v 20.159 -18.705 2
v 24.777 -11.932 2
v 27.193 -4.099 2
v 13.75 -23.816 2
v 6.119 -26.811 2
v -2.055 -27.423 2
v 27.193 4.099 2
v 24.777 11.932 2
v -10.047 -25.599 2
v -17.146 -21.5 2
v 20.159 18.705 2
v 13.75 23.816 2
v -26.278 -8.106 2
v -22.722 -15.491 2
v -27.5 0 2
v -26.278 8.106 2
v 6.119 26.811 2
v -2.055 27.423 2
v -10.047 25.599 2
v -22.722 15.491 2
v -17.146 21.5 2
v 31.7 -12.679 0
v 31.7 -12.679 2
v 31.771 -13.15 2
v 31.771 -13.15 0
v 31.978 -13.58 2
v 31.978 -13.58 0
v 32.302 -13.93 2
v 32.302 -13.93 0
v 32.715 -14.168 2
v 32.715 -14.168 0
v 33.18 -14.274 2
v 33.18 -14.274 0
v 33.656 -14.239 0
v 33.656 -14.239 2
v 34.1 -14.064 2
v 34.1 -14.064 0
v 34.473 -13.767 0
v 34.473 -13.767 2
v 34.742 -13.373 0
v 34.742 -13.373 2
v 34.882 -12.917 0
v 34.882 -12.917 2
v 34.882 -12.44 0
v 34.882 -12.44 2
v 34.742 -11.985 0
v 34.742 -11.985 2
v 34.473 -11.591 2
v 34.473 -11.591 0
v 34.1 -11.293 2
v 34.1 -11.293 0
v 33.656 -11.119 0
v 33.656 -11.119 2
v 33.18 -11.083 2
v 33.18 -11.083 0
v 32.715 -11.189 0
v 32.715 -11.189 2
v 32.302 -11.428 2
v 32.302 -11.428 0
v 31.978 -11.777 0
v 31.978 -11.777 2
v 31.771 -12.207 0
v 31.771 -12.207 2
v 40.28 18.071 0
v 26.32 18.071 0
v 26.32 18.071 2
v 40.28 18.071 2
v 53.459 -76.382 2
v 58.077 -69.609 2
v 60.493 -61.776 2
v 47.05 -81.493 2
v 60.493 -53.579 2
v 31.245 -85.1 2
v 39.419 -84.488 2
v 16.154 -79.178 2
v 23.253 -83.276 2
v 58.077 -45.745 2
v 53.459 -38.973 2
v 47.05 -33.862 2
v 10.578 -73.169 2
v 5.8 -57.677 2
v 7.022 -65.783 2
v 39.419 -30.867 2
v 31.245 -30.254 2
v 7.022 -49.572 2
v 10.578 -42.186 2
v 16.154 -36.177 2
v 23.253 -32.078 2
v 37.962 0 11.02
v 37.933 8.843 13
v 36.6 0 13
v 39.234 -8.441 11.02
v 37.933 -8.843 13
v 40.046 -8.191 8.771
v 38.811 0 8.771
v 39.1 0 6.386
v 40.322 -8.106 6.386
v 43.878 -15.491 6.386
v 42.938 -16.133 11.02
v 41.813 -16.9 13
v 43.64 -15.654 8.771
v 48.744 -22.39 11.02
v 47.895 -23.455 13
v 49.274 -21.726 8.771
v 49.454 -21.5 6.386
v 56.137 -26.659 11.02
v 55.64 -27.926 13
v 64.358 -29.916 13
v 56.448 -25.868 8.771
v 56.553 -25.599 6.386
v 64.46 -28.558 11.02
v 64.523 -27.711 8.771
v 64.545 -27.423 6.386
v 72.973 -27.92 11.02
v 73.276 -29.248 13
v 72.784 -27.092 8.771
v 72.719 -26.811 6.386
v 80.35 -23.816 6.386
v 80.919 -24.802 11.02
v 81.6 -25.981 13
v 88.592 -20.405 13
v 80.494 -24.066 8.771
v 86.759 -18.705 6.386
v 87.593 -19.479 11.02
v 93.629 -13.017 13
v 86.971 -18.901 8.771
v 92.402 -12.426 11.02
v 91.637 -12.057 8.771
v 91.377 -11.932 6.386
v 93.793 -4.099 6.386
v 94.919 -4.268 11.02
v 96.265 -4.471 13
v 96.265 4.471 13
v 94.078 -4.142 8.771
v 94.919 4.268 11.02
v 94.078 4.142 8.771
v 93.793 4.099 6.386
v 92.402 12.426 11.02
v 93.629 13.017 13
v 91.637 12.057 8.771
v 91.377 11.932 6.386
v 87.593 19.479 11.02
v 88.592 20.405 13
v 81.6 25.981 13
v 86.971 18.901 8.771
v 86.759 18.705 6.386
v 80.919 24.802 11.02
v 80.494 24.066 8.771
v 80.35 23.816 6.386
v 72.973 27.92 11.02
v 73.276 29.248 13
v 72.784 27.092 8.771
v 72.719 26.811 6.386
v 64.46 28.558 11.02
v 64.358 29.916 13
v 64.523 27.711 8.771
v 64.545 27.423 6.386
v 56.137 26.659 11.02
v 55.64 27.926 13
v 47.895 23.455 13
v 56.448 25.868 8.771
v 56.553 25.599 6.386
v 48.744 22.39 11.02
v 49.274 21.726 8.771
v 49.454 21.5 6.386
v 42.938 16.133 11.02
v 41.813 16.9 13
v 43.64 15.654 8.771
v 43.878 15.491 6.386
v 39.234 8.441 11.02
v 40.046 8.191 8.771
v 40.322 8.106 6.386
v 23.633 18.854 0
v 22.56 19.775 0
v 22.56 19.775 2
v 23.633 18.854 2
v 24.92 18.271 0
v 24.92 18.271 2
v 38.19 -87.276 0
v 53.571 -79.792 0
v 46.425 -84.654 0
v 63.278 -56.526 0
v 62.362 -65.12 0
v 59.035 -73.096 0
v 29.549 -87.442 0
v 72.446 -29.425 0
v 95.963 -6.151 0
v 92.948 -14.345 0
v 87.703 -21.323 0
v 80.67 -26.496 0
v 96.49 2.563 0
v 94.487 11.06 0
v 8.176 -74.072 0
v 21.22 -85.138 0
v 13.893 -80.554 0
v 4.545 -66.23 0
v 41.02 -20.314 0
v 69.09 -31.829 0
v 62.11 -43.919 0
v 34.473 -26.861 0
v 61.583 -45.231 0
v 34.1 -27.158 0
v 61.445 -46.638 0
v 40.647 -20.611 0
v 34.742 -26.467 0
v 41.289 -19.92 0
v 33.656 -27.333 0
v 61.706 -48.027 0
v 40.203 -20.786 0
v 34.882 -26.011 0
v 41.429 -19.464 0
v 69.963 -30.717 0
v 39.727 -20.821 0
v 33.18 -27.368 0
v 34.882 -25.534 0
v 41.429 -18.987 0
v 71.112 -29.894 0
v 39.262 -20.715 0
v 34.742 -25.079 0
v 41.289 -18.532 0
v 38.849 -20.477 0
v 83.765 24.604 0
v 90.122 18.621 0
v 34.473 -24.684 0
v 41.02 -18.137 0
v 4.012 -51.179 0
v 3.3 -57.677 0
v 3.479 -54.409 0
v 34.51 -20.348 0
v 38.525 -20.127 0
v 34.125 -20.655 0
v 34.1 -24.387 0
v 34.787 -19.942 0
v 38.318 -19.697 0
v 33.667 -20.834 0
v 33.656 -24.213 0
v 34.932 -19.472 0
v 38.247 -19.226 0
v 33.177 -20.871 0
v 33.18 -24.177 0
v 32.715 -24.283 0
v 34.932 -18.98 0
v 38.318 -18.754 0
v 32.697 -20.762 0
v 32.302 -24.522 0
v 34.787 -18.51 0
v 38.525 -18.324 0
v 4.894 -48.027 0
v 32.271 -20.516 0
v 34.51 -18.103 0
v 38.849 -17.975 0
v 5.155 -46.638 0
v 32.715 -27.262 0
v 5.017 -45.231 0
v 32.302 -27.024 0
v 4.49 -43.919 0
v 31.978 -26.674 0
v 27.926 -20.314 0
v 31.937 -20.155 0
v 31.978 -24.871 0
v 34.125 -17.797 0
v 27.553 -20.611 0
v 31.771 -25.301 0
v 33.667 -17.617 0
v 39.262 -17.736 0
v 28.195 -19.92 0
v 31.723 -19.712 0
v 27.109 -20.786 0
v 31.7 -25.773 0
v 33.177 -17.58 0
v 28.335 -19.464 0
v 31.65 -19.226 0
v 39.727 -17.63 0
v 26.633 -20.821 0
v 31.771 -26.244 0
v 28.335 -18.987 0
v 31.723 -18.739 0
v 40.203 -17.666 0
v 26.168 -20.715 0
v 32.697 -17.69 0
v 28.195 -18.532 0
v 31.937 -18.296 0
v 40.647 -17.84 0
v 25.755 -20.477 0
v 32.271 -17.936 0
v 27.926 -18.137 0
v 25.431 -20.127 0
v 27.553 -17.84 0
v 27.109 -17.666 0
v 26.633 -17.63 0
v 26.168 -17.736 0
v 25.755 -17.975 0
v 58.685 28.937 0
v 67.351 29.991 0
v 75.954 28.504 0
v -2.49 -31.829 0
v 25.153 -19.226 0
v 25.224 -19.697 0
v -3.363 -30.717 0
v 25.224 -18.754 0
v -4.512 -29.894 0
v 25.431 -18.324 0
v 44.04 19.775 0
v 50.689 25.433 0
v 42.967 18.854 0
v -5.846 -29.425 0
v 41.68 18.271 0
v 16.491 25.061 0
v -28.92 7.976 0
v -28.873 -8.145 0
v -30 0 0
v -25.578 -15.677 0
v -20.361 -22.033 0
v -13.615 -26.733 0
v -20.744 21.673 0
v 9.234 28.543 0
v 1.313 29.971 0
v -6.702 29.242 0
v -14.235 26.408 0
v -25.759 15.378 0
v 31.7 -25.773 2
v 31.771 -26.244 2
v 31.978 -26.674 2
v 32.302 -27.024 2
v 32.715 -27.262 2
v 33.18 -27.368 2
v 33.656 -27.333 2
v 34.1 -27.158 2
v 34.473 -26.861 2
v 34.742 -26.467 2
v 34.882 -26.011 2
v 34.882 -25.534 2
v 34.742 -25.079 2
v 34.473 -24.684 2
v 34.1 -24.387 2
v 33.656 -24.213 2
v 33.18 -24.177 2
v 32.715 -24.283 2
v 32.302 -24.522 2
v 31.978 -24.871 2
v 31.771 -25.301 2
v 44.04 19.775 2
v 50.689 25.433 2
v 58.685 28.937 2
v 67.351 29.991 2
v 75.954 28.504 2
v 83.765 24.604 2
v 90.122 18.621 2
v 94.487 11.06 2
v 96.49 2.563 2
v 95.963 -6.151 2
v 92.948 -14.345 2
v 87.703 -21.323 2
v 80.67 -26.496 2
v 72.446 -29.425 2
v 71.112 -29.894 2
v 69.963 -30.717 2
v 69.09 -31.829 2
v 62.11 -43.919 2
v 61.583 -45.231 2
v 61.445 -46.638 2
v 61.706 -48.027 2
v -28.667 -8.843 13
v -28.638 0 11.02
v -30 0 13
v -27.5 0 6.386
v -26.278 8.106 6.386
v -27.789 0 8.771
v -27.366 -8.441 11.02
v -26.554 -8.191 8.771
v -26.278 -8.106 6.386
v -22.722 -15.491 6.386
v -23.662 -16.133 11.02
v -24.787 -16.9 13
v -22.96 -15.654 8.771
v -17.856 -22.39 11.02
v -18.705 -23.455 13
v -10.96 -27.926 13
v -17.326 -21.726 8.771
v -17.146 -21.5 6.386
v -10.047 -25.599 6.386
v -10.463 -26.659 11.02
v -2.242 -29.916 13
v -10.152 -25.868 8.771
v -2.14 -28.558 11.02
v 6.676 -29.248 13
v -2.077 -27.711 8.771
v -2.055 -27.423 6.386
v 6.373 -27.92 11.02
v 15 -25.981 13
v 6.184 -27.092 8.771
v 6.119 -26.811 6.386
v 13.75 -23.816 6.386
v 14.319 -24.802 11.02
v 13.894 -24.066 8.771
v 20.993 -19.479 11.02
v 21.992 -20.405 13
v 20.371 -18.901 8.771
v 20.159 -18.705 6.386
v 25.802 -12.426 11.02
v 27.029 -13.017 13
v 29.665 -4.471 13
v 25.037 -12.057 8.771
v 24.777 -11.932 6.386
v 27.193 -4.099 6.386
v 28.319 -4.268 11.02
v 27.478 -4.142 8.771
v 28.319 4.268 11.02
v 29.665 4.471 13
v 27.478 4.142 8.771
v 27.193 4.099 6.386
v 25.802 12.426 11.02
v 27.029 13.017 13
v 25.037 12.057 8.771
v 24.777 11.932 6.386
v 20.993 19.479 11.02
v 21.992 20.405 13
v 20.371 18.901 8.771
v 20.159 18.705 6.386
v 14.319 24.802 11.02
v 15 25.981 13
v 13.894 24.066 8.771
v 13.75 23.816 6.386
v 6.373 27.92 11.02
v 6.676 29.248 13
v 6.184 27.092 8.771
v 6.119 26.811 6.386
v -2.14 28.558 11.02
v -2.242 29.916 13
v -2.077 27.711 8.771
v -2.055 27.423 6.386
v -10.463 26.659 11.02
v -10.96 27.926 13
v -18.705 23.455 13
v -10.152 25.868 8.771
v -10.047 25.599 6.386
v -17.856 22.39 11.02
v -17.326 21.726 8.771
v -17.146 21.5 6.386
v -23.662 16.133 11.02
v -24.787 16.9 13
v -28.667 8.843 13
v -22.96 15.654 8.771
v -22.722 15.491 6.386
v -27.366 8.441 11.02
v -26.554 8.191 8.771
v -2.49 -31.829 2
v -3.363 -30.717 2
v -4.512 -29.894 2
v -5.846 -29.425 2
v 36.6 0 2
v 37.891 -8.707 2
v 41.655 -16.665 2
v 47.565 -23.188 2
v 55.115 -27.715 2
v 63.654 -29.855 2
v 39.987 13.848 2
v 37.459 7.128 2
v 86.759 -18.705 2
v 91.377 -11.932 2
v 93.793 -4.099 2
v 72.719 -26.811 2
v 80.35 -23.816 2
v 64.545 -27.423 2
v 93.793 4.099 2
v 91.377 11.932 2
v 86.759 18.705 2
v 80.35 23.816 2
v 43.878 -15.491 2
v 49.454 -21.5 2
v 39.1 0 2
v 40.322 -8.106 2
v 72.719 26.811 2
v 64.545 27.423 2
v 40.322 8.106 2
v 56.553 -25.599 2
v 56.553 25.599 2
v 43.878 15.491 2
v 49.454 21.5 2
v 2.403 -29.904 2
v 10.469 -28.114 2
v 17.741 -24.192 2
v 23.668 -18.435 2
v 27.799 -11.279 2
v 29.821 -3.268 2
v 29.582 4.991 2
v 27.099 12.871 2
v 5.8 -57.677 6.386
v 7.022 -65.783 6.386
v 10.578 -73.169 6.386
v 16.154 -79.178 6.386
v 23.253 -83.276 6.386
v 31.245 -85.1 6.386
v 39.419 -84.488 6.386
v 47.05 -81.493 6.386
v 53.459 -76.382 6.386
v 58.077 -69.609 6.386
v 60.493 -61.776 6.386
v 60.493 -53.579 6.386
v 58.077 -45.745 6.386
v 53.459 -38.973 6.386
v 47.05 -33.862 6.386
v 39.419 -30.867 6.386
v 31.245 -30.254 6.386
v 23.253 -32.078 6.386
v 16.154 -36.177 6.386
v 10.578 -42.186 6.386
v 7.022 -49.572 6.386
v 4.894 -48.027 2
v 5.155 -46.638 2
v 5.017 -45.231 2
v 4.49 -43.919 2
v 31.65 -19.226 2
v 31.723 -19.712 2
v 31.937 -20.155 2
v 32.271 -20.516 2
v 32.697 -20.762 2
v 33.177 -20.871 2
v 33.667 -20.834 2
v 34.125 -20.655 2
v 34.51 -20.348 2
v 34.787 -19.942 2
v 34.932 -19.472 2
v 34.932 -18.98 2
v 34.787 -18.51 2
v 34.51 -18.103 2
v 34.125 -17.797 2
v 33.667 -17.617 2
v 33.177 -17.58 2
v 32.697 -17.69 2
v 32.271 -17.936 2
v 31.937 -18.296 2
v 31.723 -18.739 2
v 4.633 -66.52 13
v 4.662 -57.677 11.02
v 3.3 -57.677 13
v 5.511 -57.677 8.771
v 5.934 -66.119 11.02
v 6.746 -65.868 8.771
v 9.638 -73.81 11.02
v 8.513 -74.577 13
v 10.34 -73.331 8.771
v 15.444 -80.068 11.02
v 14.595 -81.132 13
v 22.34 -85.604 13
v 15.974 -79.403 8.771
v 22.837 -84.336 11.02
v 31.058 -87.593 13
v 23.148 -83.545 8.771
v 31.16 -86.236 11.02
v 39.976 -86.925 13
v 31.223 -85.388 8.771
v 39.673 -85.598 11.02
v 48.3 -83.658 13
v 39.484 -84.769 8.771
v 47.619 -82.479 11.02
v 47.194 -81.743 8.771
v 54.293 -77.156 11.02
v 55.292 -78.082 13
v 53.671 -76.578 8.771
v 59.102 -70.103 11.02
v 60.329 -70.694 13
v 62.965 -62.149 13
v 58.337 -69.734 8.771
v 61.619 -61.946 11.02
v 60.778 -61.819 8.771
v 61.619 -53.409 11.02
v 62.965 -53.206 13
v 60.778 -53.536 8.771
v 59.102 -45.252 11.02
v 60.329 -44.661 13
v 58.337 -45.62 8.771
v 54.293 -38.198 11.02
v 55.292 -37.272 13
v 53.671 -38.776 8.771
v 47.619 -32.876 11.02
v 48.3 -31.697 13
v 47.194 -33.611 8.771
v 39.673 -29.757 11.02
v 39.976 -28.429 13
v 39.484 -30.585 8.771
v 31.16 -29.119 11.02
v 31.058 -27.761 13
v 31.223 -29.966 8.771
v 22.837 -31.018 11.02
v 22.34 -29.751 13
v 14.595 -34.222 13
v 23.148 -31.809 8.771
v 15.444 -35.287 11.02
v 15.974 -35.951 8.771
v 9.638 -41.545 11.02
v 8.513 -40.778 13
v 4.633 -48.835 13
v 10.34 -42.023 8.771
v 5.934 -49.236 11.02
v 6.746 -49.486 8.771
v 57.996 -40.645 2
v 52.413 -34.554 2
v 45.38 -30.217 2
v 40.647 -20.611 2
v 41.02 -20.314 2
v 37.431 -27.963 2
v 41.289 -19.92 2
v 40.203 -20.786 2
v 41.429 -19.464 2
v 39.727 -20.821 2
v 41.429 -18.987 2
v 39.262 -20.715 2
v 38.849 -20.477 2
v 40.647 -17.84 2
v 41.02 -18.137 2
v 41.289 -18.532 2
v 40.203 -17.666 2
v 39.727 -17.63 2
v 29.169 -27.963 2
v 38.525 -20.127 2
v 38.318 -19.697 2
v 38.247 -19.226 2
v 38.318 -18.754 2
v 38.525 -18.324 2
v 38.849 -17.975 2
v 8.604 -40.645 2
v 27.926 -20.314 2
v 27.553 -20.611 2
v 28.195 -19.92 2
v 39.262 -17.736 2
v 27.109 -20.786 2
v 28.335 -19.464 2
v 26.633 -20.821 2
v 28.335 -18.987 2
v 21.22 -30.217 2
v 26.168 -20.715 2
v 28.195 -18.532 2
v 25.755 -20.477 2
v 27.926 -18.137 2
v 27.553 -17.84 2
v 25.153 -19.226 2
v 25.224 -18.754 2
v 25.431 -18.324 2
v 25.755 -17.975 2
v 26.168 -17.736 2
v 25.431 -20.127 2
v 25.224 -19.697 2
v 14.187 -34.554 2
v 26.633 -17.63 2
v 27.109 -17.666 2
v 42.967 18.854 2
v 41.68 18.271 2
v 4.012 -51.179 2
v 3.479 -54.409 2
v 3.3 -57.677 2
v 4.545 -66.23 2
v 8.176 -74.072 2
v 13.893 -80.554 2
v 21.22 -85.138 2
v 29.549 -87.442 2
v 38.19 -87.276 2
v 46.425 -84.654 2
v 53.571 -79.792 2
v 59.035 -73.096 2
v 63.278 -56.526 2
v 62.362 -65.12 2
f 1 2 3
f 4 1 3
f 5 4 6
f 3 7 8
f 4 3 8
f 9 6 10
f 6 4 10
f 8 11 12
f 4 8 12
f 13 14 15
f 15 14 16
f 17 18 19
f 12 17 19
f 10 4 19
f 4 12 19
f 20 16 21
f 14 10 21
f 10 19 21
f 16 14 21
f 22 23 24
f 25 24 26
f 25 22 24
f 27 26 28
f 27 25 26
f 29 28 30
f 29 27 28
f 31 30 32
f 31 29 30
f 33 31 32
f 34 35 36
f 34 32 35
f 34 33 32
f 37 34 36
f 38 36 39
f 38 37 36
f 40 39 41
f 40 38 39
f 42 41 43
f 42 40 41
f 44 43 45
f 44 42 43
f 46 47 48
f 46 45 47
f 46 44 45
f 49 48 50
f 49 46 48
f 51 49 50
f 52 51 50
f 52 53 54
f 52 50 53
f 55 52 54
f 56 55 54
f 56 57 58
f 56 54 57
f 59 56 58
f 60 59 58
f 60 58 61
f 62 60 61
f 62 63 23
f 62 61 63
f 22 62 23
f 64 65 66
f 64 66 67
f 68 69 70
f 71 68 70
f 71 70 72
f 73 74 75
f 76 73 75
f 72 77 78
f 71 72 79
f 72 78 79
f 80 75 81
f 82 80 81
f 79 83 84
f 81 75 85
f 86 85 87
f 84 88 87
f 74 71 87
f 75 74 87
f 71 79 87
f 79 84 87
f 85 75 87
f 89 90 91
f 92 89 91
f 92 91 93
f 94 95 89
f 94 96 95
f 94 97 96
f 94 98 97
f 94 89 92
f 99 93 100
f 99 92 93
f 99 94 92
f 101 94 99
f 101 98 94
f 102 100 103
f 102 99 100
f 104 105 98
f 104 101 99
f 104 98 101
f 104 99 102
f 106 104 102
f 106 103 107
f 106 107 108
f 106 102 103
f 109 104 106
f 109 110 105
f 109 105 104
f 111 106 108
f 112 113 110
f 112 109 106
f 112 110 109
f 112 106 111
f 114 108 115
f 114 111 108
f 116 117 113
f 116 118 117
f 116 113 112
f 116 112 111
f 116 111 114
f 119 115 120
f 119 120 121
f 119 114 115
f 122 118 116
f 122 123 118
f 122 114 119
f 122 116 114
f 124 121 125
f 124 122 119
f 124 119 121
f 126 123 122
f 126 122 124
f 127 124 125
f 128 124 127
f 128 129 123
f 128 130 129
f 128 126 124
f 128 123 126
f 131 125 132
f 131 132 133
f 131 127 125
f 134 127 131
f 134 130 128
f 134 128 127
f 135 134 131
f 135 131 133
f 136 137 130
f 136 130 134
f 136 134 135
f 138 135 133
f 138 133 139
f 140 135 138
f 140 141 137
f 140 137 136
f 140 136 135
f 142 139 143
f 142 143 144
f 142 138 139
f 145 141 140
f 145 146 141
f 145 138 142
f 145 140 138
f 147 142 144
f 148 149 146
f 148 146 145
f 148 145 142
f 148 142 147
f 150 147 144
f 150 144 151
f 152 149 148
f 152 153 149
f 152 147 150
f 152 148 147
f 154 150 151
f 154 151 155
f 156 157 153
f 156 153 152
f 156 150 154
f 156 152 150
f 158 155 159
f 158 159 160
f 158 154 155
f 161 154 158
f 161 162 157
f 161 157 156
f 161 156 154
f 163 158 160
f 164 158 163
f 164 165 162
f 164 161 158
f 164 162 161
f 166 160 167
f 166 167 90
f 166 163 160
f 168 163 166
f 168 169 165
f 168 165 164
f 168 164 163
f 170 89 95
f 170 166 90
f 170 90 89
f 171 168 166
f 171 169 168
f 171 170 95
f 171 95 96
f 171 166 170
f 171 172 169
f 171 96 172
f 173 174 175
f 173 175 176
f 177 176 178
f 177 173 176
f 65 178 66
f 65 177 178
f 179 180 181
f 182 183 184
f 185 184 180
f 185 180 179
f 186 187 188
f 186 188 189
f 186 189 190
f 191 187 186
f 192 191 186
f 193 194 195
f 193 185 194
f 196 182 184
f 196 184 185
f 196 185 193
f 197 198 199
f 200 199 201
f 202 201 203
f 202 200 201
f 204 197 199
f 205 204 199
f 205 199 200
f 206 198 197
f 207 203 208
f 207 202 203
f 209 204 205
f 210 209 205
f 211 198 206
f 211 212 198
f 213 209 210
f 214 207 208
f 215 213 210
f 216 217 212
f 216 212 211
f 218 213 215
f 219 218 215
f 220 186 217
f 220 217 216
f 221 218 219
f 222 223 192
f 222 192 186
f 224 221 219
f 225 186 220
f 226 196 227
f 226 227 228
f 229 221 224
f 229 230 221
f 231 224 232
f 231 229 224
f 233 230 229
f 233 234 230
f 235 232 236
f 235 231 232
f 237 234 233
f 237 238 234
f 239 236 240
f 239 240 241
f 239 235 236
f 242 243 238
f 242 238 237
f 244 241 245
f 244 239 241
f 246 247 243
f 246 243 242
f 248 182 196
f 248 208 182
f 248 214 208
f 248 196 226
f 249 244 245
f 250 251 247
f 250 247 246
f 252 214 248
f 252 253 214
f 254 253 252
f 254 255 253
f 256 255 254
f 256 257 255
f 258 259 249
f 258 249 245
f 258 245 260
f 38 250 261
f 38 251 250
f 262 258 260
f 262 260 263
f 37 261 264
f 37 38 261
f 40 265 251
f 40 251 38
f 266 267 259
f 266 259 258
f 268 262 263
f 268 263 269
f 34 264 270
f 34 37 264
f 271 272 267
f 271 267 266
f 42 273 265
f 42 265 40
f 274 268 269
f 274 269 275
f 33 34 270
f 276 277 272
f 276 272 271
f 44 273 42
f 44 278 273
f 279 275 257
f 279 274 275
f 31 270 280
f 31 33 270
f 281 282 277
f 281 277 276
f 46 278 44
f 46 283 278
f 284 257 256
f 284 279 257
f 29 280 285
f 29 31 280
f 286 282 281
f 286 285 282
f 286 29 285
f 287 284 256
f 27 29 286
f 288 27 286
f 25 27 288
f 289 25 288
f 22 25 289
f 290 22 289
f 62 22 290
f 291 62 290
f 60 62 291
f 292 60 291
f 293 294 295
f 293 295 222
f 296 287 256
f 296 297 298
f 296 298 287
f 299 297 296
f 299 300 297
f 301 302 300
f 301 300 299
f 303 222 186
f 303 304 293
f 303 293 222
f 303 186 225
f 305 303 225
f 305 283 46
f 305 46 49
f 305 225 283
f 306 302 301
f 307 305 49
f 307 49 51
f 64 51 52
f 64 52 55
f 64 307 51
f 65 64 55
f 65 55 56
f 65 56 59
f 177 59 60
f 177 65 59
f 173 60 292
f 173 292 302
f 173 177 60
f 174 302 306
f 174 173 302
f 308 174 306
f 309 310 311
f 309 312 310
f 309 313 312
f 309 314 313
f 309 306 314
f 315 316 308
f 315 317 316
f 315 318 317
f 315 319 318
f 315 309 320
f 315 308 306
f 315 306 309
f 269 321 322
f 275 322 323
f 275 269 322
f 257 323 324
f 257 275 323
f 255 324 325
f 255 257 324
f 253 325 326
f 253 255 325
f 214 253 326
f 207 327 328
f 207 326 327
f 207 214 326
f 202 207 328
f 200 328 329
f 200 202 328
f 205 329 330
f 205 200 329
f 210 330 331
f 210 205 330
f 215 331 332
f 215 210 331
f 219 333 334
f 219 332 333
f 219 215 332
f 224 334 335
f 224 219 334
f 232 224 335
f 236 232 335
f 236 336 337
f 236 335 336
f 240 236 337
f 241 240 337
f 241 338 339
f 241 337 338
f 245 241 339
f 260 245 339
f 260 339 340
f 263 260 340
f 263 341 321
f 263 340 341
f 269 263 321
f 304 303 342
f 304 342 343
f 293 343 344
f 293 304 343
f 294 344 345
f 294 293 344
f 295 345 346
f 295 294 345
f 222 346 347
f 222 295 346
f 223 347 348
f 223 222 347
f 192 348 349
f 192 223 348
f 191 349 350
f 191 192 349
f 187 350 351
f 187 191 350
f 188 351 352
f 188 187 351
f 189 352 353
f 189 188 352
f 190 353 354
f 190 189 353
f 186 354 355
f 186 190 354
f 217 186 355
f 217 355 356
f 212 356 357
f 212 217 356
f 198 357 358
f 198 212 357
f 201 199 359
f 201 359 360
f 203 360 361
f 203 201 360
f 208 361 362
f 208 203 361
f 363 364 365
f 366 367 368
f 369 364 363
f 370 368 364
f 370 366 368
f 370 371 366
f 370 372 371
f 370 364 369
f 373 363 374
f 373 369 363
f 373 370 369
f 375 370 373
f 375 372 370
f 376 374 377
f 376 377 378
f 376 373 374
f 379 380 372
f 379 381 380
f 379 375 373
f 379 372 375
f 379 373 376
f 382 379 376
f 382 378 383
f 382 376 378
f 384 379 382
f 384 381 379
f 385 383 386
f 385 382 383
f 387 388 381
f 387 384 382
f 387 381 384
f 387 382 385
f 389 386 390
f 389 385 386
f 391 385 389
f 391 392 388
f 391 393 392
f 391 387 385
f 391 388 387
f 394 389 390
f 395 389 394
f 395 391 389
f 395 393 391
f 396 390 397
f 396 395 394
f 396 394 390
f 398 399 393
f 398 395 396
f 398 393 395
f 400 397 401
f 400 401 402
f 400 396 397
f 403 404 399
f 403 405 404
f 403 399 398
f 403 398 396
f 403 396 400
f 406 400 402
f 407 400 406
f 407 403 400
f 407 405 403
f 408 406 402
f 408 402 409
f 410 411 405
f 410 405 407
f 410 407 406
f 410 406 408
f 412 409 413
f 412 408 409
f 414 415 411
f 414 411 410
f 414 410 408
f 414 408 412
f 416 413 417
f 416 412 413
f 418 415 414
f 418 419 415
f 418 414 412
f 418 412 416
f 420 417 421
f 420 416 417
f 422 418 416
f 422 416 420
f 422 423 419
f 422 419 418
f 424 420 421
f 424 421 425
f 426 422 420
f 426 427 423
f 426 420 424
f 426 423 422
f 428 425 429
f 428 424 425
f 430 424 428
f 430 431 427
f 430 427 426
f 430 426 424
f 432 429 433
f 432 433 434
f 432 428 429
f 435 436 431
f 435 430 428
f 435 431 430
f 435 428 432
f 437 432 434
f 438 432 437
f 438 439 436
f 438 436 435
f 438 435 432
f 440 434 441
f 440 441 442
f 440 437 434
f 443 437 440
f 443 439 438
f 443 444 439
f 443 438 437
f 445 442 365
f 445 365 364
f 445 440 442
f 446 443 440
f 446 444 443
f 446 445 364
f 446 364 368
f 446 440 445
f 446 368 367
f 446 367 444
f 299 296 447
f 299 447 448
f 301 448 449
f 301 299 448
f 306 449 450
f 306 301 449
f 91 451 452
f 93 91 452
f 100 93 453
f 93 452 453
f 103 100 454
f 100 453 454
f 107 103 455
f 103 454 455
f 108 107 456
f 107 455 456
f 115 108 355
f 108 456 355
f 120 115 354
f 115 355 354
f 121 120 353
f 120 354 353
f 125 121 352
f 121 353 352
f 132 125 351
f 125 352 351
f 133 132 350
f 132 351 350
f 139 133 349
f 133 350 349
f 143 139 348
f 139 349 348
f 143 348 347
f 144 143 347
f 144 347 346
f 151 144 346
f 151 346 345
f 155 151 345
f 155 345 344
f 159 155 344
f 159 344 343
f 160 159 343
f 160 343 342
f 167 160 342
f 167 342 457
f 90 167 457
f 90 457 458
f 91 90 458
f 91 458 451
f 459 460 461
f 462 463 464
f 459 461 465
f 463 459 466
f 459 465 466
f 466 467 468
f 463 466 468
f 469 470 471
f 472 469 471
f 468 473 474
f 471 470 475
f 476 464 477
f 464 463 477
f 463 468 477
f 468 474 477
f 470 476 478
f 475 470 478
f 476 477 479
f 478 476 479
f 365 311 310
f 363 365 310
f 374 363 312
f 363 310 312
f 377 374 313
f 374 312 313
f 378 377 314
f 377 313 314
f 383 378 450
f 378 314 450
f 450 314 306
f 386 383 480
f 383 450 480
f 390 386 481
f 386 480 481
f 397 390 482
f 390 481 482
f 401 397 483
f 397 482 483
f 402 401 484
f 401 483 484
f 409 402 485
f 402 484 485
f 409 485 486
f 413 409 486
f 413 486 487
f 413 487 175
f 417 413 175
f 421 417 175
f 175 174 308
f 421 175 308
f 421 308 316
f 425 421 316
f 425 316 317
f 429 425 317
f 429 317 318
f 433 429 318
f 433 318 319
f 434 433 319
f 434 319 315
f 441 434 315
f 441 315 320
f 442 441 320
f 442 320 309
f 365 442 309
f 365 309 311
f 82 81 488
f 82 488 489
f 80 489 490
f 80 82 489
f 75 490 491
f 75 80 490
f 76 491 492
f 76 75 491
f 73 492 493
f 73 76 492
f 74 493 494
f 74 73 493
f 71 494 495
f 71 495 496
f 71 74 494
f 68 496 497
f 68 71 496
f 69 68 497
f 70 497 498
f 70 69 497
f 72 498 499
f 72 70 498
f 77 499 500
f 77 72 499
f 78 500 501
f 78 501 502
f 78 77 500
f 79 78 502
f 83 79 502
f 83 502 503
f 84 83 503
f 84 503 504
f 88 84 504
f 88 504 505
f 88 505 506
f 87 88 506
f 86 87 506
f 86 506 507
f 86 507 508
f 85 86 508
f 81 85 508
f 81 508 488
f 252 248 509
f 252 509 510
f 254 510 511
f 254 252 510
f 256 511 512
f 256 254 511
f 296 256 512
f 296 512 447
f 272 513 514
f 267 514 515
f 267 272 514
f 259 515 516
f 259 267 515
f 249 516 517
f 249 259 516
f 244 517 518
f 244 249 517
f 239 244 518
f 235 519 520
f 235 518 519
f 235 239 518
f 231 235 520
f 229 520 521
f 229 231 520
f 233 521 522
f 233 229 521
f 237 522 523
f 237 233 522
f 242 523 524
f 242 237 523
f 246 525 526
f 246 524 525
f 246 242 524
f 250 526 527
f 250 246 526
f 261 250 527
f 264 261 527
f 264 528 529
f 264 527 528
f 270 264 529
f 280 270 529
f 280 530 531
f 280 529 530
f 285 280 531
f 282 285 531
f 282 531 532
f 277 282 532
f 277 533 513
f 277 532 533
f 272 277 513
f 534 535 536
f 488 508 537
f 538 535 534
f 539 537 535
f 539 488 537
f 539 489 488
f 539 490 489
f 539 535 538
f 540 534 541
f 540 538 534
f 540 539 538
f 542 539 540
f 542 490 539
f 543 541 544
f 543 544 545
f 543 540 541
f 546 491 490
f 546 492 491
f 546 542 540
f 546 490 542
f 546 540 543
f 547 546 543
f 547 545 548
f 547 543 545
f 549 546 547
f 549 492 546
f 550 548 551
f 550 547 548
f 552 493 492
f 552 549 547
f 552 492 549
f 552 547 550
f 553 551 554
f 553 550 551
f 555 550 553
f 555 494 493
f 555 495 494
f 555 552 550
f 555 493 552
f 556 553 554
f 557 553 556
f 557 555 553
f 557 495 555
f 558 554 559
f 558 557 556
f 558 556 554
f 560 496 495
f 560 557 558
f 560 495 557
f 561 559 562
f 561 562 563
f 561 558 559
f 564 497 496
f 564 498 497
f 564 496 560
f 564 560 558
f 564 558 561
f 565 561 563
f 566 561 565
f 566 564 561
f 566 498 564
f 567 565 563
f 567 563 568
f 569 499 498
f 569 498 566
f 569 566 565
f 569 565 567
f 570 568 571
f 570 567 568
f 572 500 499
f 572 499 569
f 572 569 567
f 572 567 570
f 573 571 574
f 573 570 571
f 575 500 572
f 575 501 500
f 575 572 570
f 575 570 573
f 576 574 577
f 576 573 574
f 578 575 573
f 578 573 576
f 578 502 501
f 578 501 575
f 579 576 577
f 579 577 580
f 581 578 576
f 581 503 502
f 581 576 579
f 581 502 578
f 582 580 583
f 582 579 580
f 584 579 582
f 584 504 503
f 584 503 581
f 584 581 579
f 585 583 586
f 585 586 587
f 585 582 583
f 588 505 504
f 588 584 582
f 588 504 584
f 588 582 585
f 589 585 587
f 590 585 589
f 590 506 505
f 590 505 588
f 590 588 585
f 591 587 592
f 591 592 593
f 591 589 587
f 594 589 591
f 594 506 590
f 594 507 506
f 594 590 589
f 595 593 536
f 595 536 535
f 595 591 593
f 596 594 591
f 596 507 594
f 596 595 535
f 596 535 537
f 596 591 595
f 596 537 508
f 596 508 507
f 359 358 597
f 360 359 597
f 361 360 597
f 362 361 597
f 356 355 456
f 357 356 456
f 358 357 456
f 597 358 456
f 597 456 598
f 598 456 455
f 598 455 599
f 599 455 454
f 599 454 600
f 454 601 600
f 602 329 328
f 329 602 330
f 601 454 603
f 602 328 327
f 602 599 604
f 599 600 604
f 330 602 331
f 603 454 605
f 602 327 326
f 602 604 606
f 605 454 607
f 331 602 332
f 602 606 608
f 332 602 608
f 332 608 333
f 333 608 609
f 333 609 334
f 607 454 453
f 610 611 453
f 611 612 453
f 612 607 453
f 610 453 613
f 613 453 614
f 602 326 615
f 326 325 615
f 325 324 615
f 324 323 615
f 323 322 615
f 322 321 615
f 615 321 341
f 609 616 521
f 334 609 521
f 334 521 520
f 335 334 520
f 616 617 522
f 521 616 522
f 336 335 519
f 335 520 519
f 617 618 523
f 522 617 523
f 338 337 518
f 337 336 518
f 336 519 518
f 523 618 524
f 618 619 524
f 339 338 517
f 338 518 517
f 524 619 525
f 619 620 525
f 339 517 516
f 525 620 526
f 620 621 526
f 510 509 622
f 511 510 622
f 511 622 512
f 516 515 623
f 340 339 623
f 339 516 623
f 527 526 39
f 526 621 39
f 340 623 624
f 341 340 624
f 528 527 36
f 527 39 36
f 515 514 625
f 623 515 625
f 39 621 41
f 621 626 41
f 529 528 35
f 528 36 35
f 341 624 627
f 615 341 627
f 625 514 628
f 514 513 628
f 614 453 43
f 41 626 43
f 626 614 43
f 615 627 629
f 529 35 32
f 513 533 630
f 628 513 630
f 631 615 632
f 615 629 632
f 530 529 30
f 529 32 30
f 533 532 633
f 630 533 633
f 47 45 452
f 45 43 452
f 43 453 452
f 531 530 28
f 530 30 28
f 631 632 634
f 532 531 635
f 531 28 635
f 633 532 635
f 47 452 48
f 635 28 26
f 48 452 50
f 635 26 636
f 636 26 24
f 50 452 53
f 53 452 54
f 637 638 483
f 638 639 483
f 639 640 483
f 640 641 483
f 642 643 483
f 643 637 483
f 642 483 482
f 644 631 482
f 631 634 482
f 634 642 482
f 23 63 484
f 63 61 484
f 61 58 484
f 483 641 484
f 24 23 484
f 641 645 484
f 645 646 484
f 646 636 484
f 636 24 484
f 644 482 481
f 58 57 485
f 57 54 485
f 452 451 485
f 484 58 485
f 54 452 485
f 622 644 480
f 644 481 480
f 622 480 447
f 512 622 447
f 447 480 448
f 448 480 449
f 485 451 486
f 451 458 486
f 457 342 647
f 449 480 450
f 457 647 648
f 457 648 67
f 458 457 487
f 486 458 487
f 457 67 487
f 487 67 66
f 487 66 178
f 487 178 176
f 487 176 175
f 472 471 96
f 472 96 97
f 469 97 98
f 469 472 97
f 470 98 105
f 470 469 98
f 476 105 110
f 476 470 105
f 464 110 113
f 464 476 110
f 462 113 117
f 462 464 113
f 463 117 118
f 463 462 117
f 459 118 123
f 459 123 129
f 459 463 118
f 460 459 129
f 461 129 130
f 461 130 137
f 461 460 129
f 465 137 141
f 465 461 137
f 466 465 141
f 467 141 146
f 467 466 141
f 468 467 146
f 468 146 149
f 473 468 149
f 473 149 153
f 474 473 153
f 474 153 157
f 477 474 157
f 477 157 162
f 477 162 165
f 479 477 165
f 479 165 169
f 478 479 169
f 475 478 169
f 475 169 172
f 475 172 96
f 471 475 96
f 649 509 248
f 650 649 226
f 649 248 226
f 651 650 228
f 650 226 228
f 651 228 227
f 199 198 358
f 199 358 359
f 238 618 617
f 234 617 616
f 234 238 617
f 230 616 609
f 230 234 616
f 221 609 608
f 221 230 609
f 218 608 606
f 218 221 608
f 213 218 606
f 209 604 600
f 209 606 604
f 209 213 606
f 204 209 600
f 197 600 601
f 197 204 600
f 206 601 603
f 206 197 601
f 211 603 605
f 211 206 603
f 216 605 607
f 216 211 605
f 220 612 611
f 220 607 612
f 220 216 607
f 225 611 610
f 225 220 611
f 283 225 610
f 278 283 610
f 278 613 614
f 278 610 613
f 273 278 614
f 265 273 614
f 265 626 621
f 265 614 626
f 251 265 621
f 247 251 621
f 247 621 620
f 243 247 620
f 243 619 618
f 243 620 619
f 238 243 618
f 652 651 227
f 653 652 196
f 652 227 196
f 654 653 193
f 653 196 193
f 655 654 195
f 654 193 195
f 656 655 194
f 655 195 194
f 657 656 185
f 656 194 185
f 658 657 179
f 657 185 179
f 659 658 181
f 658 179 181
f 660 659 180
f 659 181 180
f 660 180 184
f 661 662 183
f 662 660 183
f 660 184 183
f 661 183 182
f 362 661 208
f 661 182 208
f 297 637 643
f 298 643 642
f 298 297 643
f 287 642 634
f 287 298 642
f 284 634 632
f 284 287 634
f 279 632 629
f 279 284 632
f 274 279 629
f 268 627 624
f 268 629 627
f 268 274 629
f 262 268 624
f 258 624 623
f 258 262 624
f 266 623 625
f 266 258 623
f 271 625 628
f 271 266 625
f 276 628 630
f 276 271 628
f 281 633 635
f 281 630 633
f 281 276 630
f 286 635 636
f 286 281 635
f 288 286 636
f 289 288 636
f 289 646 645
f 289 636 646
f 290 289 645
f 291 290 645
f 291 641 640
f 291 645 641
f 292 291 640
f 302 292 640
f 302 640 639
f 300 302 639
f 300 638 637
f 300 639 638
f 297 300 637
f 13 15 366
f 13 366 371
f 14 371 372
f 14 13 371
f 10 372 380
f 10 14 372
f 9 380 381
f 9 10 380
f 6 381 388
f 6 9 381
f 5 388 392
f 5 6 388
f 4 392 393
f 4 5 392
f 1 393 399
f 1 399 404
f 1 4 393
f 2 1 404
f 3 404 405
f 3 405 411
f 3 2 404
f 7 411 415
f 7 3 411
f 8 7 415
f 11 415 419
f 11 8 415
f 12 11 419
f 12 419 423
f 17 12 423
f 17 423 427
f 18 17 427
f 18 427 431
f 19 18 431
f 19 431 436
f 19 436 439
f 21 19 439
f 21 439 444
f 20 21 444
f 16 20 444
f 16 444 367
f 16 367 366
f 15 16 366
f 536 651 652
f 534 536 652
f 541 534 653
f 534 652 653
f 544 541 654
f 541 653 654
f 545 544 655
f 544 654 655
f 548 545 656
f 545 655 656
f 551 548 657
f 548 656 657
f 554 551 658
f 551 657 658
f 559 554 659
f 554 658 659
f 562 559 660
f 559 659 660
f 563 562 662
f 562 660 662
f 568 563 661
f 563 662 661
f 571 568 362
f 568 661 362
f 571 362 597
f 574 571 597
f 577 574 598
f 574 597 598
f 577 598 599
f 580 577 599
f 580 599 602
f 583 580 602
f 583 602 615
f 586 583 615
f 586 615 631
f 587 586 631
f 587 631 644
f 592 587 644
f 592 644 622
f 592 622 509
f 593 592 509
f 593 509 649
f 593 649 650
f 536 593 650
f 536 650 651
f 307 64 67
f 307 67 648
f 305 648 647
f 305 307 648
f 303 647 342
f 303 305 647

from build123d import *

# Parameters (mm, degrees)
SKETCH_1_R          = 30
SKETCH_1_R_2        = 27.5
EXTRUDE_1_DEPTH     = 13
SKETCH_1_R_3        = 29.999999999999996
EXTRUDE_1_2_DEPTH   = 13
EXTRUDE_1_3_DEPTH   = 13
EXTRUDE_2_DEPTH     = 2
SKETCH_3_R          = 1.6500000000000017
SKETCH_3_R_2        = 1.5999999999999979
SKETCH_3_R_3        = 1.5999999999999985
SKETCH_3_R_4        = 1.6000000000000019
CUT_EXTRUDE_5_DEPTH = 132.10250765535577
FILLET_1_R          = 10


with BuildPart() as part:
    # 草图1 → 凸台-拉伸1 (new body)
    with BuildSketch(Plane.XY):
        with Locations(Location((0, 0, 0), (0, 0, 180))):
            Circle(SKETCH_1_R)
        with Locations(Location((0, 0, 0), (0, 0, 180))):
            Circle(SKETCH_1_R_2, mode=Mode.SUBTRACT)
    extrude(amount=EXTRUDE_1_DEPTH)



with BuildPart() as body_2:
    # 草图1 → Extrude 1 2 (new body)
    with BuildSketch(Plane.XY):
        with Locations(Location((66.6, 0, 0), (0, 0, 180))):
            Circle(SKETCH_1_R_3)
        with Locations(Location((66.6, 0, 0), (0, 0, 180))):
            Circle(SKETCH_1_R_2, mode=Mode.SUBTRACT)
    extrude(amount=EXTRUDE_1_2_DEPTH)


with BuildPart() as body_3:
    # 草图1 → Extrude 1 3 (new body)
    with BuildSketch(Plane.XY):
        with Locations(Location((33.30000000000001, -57.6772918920436, 0), (0, 0, 180))):
            Circle(SKETCH_1_R_3)
        with Locations(Location((33.30000000000001, -57.6772918920436, 0), (0, 0, 180))):
            Circle(SKETCH_1_R_2, mode=Mode.SUBTRACT)
    extrude(amount=EXTRUDE_1_3_DEPTH)


with BuildPart() as part_1:
    add(part.part)

    add(body_2.part)  # 凸台-拉伸2 merges body 2

    add(body_3.part)  # 凸台-拉伸2 merges body 3
    # 草图2 → 凸台-拉伸2 (add)
    with BuildSketch(Plane.XY):
        with BuildLine():
            Line((26.3198925252566, 18.070831312697457), (40.280107474743396, 18.070831312697457))
            ThreePointArc((40.280107474743396, 18.070831312697457), (42.3441853289733, 18.516758123597654), (44.04009212120862, 19.77499826802639))
            ThreePointArc((44.04009212120862, 19.77499826802639), (92.58076211353317, 15), (72.44569692050842, -29.424952464083248))
            ThreePointArc((72.44569692050842, -29.424952464083248), (70.50807559525407, -30.264530756395246), (69.08985272167097, -31.829111208097117))
            Line((69.08985272167097, -31.829111208097117), (62.10974524692759, -43.91901199664395))
            ThreePointArc((62.10974524692759, -43.91901199664395), (61.46389026628078, -45.92951925924603), (61.70560479929982, -48.027337695986766))
            ThreePointArc((61.70560479929982, -48.027337695986766), (33.300000000000004, -87.6772918920436), (4.894395200700185, -48.02733769598677))
            ThreePointArc((4.894395200700185, -48.02733769598677), (5.13610973371921, -45.92951925924604), (4.4902547530724135, -43.91901199664397))
            Line((4.4902547530724135, -43.91901199664397), (-2.489852721670984, -31.829111208097103))
            ThreePointArc((-2.489852721670984, -31.829111208097103), (-3.9080755952540875, -30.264530756395228), (-5.845696920508439, -29.42495246408323))
            ThreePointArc((-5.845696920508439, -29.42495246408323), (-25.980762113533153, 15.000000000000009), (22.55990787879137, 19.77499826802639))
            ThreePointArc((22.55990787879137, 19.77499826802639), (24.25581467102669, 18.516758123597654), (26.3198925252566, 18.070831312697457))
        make_face()
    extrude(amount=EXTRUDE_2_DEPTH)

    # 草图3 → 切除-拉伸5 (cut, through all)
    with BuildSketch(Plane.XY):
        with Locations(Location((33.3, -19.225763964014533, 0), (0, 0, 180))):
            Circle(SKETCH_3_R)
        with Locations(Location((33.3, -12.678793774014526, 0), (0, 0, 180))):
            Circle(SKETCH_3_R_2)
        with Locations(Location((39.84697019, -19.225763964014533, 0), (0, 0, 180))):
            Circle(SKETCH_3_R_3)
        with Locations(Location((33.3, -25.772734154014536, 0), (0, 0, 180))):
            Circle(SKETCH_3_R_3)
        with Locations(Location((26.75302980999999, -19.225763964014533, 0), (0, 0, 180))):
            Circle(SKETCH_3_R_4)
    extrude(amount=CUT_EXTRUDE_5_DEPTH, mode=Mode.SUBTRACT)

    # 圆角1
    # the kernel refuses this fillet: 10 mm, written as the material it takes off along each edge
    with BuildSketch(Plane(origin=(0, 0, 13), x_dir=(-1, 1.2e-16, 0), z_dir=(1.2e-16, 1, 0))) as fillet_1_piece_1:
        with BuildLine():
            CenterArc((37.5, -6.614378277661482), FILLET_1_R, 138.59037789072914, 41.409622109270856)
            Line((27.5, -6.614378277661482), (27.3, -6.614378277661482))
            Line((27.3, -6.614378277661482), (27.3, 0))
            Line((27.3, 0), (27.5, 0.1999999999999993))
            ThreePointArc((27.5, 0.1999999999999993), (28.75, 0.1999999999999993), (29.85, 0.1322875655532254))
            Line((29.85, 0.1322875655532254), (30, -3.55e-15))
        make_face()
    revolve(axis=Axis((0, 0, 13), (0, 0, 1)), mode=Mode.SUBTRACT)
    with BuildSketch(Plane(origin=(66.6, 0, 13), x_dir=(-1, 1.2e-16, 0), z_dir=(1.2e-16, 1, 0))) as fillet_1_piece_2:
        with BuildLine():
            CenterArc((37.5, -6.614378277661482), FILLET_1_R, 138.59037789072914, 41.409622109270856)
            Line((27.5, -6.614378277661482), (27.299999999999997, -6.614378277661482))
            Line((27.299999999999997, -6.614378277661482), (27.299999999999997, 0))
            Line((27.299999999999997, 0), (27.5, 0.1999999999999993))
            ThreePointArc((27.5, 0.1999999999999993), (28.75, 0.1999999999999993), (29.85, 0.1322875655532254))
            Line((29.85, 0.1322875655532254), (30, -3.55e-15))
        make_face()
    revolve(axis=Axis((66.6, 0, 13), (0, 0, 1)), mode=Mode.SUBTRACT)
    with BuildSketch(Plane(origin=(33.30000000000001, -57.6772918920436, 13), x_dir=(-1, 0, 0), z_dir=(0, 1, 0))) as fillet_1_piece_3:
        with BuildLine():
            CenterArc((37.5, -6.614378277661478), FILLET_1_R, 138.59037789072914, 41.409622109270856)
            Line((27.5, -6.614378277661478), (27.3, -6.614378277661478))
            Line((27.3, -6.614378277661478), (27.3, 0))
            Line((27.3, 0), (27.5, 0.1999999999999993))
            ThreePointArc((27.5, 0.1999999999999993), (28.75, 0.1999999999999993), (29.849999999999998, 0.1322875655532254))
            Line((29.849999999999998, 0.1322875655532254), (30, -3.55e-15))
        make_face()
    revolve(axis=Axis((33.30000000000001, -57.6772918920436, 13), (0, 0, 1)), mode=Mode.SUBTRACT)


solid = part_1.part
